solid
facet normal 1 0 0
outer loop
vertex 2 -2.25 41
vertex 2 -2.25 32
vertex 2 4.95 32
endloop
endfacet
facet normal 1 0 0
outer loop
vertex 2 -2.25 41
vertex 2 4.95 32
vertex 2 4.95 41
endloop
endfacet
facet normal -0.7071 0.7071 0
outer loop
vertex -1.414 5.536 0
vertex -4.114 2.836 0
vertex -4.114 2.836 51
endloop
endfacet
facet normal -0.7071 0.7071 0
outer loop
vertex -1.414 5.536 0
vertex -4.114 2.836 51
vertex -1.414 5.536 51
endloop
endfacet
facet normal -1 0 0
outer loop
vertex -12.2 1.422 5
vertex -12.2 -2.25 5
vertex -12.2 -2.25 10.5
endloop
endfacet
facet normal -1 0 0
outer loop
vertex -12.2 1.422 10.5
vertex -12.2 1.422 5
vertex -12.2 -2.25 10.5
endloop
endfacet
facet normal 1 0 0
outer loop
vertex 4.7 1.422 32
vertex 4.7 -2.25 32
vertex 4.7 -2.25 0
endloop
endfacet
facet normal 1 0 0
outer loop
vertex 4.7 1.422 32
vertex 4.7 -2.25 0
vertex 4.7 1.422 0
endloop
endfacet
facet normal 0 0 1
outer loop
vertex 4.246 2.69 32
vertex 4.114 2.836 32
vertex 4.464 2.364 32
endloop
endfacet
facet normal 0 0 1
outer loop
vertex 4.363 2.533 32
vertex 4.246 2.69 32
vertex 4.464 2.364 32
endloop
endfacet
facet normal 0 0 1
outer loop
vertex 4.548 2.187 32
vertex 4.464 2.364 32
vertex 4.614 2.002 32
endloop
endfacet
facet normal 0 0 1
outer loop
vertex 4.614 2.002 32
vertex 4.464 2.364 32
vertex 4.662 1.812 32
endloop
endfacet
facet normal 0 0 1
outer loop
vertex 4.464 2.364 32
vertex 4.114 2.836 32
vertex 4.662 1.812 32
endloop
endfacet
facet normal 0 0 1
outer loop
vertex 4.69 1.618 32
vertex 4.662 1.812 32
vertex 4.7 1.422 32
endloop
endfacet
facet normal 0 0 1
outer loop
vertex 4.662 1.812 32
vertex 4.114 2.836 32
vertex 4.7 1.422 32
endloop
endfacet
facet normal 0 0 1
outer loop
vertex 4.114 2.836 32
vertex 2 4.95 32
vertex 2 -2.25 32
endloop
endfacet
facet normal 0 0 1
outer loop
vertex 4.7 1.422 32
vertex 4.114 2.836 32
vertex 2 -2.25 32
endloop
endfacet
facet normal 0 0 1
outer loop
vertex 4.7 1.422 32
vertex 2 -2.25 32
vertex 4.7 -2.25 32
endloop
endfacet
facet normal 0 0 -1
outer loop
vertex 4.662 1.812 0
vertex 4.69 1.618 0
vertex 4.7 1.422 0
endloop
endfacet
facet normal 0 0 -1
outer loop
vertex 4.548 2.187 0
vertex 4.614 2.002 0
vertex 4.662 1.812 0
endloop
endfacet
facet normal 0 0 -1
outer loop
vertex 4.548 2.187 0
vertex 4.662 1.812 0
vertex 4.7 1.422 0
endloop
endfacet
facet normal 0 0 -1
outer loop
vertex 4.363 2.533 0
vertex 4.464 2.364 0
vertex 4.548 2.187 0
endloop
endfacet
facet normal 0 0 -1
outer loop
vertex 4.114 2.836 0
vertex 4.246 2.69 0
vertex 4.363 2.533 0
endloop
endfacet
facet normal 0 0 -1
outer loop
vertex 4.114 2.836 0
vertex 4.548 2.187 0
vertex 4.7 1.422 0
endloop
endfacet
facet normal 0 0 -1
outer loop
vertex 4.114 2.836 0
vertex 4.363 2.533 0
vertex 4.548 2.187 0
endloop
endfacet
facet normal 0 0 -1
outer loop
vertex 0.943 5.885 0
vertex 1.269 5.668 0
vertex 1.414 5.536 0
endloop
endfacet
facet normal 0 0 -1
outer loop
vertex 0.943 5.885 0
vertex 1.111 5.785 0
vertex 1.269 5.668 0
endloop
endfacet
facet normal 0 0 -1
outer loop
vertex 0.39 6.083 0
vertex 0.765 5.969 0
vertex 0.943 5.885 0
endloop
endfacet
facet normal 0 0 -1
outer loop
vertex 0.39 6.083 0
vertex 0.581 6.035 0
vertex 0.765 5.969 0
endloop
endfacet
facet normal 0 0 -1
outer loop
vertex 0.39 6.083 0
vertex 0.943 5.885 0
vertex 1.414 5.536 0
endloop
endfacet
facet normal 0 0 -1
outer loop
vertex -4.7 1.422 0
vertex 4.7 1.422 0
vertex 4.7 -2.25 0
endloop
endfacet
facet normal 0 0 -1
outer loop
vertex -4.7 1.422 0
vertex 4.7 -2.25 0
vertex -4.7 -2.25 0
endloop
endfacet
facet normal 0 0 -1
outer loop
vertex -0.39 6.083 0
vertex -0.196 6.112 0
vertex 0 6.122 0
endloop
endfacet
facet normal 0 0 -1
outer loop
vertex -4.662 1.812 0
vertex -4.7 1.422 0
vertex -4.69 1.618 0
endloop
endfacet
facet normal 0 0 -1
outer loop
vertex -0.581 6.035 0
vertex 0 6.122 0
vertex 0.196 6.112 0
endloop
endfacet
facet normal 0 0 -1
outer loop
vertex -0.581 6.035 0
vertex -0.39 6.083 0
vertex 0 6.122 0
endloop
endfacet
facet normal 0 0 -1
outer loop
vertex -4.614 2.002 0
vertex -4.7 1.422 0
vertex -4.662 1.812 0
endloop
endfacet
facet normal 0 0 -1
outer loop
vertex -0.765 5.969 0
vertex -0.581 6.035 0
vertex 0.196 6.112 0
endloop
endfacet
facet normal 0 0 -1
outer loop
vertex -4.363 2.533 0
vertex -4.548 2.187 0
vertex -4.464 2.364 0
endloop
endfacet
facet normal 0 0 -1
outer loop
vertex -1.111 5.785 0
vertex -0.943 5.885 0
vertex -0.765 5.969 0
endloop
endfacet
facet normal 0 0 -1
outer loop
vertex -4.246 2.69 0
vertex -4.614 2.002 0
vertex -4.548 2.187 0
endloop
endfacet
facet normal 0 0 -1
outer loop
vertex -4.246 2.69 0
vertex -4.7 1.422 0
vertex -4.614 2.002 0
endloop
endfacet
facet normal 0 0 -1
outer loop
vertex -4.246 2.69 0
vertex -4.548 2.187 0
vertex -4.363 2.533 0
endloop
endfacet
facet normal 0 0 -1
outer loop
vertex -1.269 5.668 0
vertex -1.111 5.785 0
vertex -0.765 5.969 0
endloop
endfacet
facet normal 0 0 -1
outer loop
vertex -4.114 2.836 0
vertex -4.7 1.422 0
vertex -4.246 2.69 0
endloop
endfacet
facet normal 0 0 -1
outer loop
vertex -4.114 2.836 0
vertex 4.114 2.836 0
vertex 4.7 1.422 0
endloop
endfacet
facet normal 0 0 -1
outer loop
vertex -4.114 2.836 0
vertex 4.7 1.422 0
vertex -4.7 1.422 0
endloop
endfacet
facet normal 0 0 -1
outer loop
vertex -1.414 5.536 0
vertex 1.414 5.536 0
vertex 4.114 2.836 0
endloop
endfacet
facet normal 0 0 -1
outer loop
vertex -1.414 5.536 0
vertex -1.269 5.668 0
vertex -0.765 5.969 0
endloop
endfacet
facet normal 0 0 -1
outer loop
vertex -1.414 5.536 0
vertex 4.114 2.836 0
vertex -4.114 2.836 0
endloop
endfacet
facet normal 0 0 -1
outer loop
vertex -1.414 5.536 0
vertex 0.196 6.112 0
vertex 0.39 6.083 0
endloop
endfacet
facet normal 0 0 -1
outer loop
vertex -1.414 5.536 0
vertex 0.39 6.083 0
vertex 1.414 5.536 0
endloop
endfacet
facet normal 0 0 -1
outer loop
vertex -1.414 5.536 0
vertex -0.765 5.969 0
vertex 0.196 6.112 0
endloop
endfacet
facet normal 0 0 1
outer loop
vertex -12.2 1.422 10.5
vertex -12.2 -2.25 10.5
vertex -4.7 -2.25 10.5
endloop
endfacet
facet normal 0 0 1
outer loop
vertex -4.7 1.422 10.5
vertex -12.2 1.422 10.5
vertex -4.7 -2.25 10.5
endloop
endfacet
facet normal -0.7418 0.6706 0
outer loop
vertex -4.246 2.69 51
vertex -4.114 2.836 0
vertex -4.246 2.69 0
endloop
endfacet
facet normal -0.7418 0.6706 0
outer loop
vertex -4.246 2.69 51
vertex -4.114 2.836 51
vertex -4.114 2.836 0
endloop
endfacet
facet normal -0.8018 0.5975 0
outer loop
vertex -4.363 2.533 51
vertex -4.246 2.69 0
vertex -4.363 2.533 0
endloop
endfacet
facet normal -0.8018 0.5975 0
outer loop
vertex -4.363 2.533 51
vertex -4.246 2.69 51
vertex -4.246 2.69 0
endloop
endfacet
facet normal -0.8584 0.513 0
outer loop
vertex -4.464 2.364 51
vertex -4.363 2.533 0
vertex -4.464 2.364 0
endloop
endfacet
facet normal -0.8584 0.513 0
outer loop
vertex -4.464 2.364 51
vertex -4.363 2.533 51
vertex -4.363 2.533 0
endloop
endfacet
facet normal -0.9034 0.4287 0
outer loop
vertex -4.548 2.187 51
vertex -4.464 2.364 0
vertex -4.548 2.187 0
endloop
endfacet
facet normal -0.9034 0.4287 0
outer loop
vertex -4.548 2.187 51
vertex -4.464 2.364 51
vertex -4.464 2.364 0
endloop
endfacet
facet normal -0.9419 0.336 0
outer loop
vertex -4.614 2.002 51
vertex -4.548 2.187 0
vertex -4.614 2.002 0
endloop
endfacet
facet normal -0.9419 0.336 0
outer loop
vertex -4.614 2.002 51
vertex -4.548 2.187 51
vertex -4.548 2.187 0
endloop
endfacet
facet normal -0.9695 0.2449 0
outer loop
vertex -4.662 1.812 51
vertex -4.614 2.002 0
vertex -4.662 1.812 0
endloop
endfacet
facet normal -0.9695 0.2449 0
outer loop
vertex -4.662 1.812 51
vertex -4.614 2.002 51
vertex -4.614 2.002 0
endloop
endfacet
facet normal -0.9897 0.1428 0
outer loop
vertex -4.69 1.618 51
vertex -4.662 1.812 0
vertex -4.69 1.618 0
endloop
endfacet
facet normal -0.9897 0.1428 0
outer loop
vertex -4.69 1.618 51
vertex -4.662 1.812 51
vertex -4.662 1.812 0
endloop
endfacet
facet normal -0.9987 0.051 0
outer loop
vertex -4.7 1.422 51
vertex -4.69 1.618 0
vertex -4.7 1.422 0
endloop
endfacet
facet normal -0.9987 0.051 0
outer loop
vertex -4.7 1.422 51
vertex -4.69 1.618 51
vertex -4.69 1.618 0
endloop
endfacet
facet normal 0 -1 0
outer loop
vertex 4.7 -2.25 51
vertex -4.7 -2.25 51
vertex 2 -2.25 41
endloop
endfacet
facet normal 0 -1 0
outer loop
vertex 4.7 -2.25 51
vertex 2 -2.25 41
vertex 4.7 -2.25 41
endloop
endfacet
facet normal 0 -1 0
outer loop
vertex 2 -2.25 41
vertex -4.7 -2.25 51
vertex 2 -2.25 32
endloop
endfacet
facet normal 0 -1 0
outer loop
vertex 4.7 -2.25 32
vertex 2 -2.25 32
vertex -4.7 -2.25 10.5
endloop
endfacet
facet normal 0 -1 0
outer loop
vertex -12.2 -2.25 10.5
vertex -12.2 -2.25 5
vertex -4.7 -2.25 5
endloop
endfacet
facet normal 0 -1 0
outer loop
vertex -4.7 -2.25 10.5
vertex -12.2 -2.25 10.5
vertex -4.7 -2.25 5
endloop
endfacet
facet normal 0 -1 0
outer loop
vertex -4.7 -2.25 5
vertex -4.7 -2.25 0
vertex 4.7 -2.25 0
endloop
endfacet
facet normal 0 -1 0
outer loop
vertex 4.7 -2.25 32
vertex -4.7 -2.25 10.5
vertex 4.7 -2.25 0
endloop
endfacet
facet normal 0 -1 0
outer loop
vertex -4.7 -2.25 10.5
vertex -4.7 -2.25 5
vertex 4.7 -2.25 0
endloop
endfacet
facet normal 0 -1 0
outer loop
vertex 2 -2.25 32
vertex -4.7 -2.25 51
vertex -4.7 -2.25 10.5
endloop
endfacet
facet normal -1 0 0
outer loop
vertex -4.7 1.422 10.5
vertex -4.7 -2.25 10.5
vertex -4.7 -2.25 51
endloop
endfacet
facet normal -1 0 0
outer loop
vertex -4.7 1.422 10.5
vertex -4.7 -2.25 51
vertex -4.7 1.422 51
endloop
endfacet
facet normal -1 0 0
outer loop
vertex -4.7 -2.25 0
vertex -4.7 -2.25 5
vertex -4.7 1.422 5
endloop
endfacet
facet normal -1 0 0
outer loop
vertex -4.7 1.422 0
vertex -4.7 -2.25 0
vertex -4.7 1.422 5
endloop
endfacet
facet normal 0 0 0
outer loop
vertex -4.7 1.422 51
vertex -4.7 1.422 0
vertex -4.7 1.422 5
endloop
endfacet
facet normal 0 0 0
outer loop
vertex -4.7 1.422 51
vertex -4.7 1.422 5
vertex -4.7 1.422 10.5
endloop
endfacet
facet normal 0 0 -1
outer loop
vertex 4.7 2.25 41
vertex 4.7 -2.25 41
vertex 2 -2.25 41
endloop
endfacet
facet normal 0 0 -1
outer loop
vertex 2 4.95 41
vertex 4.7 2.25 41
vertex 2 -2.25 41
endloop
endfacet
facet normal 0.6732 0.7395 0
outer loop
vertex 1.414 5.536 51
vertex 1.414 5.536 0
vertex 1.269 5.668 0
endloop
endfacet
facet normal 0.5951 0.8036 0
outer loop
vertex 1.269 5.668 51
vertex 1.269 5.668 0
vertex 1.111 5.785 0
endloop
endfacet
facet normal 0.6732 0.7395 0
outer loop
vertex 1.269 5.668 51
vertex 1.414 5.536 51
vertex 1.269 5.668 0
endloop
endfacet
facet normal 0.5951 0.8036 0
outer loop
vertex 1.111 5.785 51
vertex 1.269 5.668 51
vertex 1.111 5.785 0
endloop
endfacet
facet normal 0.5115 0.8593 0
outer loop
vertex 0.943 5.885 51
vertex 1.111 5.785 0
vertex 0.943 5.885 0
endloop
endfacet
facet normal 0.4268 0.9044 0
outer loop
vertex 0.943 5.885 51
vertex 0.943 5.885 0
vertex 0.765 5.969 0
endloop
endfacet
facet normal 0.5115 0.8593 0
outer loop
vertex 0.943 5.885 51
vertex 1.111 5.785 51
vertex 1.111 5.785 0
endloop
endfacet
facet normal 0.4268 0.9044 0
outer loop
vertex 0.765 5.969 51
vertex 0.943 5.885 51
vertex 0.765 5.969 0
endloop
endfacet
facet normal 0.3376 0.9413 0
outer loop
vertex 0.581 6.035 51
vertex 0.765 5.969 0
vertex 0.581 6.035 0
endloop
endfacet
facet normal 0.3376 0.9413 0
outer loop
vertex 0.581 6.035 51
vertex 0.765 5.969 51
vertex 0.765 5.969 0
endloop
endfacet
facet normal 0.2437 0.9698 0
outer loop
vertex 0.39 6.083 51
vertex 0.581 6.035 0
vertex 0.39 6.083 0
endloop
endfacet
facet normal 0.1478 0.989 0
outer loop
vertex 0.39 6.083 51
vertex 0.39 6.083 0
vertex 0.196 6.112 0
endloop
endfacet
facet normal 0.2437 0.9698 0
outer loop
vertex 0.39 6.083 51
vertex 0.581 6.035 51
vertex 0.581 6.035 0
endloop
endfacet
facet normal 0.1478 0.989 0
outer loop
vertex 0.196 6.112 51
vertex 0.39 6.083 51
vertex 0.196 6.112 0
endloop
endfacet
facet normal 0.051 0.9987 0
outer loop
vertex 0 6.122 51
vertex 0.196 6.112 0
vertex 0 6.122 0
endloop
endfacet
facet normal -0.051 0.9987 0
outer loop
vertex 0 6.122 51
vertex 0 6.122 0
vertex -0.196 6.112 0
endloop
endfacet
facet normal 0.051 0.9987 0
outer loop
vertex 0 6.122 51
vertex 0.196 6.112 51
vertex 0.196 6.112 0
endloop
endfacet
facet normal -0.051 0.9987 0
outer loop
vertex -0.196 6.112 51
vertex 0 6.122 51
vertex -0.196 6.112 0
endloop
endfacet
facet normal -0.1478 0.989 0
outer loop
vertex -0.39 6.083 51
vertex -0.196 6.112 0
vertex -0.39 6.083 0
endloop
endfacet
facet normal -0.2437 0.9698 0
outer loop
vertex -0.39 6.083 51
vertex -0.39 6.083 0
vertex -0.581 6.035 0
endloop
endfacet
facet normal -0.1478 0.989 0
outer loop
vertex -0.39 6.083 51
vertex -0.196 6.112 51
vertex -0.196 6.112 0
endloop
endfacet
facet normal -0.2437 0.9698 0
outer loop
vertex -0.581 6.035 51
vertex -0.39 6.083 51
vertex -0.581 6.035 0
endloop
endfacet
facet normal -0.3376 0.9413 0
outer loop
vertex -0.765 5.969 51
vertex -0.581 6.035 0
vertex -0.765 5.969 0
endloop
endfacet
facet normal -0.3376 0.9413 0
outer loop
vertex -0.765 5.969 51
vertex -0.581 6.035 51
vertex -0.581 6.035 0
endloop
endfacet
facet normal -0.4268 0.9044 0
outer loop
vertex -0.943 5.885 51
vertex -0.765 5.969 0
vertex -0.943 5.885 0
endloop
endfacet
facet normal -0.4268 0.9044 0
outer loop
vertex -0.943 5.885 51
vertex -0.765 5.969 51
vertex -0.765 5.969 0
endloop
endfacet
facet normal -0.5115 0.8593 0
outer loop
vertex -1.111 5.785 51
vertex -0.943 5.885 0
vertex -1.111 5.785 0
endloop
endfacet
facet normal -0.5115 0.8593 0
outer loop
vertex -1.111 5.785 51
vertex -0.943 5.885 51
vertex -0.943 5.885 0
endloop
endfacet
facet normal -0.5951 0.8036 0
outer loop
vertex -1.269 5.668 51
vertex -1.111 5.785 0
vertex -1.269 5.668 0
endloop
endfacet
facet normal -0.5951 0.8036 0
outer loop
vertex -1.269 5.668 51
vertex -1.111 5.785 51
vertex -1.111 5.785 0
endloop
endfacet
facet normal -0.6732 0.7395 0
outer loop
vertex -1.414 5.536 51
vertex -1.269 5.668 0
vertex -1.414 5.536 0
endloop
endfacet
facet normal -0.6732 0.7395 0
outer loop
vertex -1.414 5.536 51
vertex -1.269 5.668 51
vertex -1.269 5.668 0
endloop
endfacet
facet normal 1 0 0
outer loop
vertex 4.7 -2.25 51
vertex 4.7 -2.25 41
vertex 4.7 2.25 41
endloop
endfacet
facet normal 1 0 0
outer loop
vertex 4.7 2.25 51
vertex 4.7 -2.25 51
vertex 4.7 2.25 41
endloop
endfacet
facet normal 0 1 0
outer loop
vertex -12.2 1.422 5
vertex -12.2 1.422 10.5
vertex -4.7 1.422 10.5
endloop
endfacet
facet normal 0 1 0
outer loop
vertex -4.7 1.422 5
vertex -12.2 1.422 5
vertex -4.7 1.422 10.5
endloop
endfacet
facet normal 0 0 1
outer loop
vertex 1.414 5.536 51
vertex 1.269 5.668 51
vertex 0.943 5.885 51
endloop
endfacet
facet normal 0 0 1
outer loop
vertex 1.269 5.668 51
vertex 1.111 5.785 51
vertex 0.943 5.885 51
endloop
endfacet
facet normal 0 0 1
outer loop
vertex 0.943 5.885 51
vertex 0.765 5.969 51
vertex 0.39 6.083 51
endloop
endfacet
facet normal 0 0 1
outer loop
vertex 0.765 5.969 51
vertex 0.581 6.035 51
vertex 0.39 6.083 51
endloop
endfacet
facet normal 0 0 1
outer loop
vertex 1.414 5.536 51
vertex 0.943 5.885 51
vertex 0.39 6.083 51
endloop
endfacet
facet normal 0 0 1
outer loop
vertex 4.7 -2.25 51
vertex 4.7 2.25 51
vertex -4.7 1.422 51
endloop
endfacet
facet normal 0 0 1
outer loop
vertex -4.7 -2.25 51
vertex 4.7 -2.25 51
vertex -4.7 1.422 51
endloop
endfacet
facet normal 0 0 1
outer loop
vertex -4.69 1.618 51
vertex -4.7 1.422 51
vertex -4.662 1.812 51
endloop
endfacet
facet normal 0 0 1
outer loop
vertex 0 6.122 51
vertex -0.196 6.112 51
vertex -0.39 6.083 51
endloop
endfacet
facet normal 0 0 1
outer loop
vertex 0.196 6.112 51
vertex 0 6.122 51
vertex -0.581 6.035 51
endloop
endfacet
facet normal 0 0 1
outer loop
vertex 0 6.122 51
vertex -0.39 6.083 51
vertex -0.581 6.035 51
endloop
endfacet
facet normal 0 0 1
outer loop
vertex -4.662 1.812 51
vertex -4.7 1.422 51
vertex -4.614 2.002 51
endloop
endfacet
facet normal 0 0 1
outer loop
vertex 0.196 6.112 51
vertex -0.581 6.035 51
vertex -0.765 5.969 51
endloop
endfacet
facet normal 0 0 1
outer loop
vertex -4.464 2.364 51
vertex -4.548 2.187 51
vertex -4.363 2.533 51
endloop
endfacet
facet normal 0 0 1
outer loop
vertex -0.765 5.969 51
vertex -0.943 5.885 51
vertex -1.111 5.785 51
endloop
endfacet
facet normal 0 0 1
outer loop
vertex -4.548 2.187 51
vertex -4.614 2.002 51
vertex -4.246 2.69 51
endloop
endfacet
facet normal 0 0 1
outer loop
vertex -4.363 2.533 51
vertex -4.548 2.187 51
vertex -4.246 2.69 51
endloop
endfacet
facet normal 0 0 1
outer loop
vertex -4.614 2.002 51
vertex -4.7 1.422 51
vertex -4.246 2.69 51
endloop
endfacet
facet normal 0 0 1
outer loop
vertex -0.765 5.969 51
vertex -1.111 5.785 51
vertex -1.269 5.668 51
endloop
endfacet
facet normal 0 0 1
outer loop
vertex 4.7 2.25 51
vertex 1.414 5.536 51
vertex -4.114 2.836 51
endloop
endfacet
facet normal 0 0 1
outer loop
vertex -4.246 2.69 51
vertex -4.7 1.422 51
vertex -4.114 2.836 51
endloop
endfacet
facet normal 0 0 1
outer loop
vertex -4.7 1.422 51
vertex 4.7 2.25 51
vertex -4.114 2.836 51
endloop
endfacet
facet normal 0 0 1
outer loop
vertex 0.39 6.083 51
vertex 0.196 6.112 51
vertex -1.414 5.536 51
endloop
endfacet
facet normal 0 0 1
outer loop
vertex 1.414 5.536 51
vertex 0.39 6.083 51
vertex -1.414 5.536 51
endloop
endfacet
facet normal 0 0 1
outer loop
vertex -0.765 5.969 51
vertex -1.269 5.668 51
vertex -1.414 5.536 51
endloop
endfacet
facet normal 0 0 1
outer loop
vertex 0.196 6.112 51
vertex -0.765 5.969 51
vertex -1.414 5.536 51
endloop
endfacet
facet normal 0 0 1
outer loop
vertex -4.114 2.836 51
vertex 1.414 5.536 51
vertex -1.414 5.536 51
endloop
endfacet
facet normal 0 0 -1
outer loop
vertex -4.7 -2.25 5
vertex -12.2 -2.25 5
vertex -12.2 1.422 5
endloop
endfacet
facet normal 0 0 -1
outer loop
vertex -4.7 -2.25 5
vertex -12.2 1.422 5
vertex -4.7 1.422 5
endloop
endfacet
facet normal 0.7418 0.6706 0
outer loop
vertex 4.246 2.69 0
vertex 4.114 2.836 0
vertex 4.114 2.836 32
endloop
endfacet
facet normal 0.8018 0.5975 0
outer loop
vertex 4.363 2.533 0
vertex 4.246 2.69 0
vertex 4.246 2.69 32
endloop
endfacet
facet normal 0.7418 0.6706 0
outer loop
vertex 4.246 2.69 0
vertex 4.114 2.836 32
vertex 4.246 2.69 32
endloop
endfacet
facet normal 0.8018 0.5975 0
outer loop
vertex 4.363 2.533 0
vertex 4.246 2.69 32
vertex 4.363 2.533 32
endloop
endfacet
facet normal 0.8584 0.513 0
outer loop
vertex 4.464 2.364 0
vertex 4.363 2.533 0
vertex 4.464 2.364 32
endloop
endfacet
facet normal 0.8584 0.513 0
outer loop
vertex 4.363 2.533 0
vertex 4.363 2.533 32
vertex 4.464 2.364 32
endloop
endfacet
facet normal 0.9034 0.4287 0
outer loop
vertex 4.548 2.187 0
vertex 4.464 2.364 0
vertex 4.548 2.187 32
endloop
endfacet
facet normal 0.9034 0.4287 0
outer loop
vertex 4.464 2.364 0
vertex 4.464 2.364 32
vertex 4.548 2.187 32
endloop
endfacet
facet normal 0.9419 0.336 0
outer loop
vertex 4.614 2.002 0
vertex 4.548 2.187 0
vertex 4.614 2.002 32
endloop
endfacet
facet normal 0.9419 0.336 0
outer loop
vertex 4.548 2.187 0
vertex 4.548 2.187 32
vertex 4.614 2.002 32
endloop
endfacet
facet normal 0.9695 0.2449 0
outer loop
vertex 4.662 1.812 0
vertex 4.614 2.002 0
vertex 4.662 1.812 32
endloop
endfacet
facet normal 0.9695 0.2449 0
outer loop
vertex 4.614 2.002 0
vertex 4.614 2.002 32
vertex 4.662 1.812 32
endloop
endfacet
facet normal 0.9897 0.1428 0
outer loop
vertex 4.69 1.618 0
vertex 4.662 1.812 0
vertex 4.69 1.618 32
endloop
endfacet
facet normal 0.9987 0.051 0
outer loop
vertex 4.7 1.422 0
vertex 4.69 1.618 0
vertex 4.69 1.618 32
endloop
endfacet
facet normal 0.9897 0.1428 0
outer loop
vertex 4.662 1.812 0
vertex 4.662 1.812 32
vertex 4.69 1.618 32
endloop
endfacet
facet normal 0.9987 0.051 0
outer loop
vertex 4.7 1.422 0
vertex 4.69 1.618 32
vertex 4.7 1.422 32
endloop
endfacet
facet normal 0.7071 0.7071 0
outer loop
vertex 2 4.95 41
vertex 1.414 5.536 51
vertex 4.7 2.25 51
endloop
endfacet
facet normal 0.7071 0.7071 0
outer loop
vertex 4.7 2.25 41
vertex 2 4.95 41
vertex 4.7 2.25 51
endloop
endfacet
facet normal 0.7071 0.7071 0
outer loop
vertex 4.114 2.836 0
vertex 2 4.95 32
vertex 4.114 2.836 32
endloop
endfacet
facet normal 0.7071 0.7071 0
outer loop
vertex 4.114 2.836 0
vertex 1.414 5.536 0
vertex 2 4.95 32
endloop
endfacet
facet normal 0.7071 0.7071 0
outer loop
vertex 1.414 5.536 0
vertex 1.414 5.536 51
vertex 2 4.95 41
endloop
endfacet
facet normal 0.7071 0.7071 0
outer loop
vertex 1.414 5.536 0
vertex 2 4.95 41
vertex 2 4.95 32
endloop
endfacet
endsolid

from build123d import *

# Parameters (mm, degrees)
SZKIC1_W                    = 9.4
SZKIC1_H                    = 4.5
DODANIE_WYCI_GNI_CIE1_DEPTH = 51
SZKIC2_W                    = 2.7
SZKIC2_H                    = 9
SZKIC2_W_2                  = 5.3
WYTNIJ_WYCI_GNI_CIE1_DEPTH  = 10
ZAOKR_GLENIE1_R             = 2
SZKIC5_W                    = 7.5
SZKIC5_H                    = 5.5
DODANIE_WYCI_GNI_CIE4_DEPTH = 3.67157


with BuildPart() as part:
    # Szkic1 → Dodanie-wyciągnięcie1 (new body)
    with BuildSketch(Plane.XY):
        Polygon((0, 6.95), (4.7, 2.25), (-4.7, 2.25), align=None)
        Rectangle(SZKIC1_W, SZKIC1_H)
    extrude(amount=DODANIE_WYCI_GNI_CIE1_DEPTH)

    # Szkic2 → Wytnij-wyciągnięcie1 (cut)
    with BuildSketch(Plane.XZ.offset(2.25)):
        with Locations((3.35, 36.5)):
            Rectangle(SZKIC2_W, SZKIC2_H)
        with Locations((7.35, 36.5)):
            Rectangle(SZKIC2_W_2, SZKIC2_H)
    extrude(amount=-WYTNIJ_WYCI_GNI_CIE1_DEPTH, mode=Mode.SUBTRACT)

    # Zaokrąglenie1
    zaokr_glenie1_edges = [part.edges().sort_by_distance(p)[0] for p in [
        (-4.7, 2.25, 25.5),
        (0, 6.95, 25.5),
        (4.7, 2.25, 16),
    ]]
    fillet(zaokr_glenie1_edges, radius=ZAOKR_GLENIE1_R)

    # Szkic5 → Dodanie-wyciągnięcie4 (add)
    with BuildSketch(Plane.XZ.offset(2.25)):
        with Locations((-8.45, 7.75)):
            Rectangle(SZKIC5_W, SZKIC5_H)
    extrude(amount=-DODANIE_WYCI_GNI_CIE4_DEPTH)


solid = part.part
